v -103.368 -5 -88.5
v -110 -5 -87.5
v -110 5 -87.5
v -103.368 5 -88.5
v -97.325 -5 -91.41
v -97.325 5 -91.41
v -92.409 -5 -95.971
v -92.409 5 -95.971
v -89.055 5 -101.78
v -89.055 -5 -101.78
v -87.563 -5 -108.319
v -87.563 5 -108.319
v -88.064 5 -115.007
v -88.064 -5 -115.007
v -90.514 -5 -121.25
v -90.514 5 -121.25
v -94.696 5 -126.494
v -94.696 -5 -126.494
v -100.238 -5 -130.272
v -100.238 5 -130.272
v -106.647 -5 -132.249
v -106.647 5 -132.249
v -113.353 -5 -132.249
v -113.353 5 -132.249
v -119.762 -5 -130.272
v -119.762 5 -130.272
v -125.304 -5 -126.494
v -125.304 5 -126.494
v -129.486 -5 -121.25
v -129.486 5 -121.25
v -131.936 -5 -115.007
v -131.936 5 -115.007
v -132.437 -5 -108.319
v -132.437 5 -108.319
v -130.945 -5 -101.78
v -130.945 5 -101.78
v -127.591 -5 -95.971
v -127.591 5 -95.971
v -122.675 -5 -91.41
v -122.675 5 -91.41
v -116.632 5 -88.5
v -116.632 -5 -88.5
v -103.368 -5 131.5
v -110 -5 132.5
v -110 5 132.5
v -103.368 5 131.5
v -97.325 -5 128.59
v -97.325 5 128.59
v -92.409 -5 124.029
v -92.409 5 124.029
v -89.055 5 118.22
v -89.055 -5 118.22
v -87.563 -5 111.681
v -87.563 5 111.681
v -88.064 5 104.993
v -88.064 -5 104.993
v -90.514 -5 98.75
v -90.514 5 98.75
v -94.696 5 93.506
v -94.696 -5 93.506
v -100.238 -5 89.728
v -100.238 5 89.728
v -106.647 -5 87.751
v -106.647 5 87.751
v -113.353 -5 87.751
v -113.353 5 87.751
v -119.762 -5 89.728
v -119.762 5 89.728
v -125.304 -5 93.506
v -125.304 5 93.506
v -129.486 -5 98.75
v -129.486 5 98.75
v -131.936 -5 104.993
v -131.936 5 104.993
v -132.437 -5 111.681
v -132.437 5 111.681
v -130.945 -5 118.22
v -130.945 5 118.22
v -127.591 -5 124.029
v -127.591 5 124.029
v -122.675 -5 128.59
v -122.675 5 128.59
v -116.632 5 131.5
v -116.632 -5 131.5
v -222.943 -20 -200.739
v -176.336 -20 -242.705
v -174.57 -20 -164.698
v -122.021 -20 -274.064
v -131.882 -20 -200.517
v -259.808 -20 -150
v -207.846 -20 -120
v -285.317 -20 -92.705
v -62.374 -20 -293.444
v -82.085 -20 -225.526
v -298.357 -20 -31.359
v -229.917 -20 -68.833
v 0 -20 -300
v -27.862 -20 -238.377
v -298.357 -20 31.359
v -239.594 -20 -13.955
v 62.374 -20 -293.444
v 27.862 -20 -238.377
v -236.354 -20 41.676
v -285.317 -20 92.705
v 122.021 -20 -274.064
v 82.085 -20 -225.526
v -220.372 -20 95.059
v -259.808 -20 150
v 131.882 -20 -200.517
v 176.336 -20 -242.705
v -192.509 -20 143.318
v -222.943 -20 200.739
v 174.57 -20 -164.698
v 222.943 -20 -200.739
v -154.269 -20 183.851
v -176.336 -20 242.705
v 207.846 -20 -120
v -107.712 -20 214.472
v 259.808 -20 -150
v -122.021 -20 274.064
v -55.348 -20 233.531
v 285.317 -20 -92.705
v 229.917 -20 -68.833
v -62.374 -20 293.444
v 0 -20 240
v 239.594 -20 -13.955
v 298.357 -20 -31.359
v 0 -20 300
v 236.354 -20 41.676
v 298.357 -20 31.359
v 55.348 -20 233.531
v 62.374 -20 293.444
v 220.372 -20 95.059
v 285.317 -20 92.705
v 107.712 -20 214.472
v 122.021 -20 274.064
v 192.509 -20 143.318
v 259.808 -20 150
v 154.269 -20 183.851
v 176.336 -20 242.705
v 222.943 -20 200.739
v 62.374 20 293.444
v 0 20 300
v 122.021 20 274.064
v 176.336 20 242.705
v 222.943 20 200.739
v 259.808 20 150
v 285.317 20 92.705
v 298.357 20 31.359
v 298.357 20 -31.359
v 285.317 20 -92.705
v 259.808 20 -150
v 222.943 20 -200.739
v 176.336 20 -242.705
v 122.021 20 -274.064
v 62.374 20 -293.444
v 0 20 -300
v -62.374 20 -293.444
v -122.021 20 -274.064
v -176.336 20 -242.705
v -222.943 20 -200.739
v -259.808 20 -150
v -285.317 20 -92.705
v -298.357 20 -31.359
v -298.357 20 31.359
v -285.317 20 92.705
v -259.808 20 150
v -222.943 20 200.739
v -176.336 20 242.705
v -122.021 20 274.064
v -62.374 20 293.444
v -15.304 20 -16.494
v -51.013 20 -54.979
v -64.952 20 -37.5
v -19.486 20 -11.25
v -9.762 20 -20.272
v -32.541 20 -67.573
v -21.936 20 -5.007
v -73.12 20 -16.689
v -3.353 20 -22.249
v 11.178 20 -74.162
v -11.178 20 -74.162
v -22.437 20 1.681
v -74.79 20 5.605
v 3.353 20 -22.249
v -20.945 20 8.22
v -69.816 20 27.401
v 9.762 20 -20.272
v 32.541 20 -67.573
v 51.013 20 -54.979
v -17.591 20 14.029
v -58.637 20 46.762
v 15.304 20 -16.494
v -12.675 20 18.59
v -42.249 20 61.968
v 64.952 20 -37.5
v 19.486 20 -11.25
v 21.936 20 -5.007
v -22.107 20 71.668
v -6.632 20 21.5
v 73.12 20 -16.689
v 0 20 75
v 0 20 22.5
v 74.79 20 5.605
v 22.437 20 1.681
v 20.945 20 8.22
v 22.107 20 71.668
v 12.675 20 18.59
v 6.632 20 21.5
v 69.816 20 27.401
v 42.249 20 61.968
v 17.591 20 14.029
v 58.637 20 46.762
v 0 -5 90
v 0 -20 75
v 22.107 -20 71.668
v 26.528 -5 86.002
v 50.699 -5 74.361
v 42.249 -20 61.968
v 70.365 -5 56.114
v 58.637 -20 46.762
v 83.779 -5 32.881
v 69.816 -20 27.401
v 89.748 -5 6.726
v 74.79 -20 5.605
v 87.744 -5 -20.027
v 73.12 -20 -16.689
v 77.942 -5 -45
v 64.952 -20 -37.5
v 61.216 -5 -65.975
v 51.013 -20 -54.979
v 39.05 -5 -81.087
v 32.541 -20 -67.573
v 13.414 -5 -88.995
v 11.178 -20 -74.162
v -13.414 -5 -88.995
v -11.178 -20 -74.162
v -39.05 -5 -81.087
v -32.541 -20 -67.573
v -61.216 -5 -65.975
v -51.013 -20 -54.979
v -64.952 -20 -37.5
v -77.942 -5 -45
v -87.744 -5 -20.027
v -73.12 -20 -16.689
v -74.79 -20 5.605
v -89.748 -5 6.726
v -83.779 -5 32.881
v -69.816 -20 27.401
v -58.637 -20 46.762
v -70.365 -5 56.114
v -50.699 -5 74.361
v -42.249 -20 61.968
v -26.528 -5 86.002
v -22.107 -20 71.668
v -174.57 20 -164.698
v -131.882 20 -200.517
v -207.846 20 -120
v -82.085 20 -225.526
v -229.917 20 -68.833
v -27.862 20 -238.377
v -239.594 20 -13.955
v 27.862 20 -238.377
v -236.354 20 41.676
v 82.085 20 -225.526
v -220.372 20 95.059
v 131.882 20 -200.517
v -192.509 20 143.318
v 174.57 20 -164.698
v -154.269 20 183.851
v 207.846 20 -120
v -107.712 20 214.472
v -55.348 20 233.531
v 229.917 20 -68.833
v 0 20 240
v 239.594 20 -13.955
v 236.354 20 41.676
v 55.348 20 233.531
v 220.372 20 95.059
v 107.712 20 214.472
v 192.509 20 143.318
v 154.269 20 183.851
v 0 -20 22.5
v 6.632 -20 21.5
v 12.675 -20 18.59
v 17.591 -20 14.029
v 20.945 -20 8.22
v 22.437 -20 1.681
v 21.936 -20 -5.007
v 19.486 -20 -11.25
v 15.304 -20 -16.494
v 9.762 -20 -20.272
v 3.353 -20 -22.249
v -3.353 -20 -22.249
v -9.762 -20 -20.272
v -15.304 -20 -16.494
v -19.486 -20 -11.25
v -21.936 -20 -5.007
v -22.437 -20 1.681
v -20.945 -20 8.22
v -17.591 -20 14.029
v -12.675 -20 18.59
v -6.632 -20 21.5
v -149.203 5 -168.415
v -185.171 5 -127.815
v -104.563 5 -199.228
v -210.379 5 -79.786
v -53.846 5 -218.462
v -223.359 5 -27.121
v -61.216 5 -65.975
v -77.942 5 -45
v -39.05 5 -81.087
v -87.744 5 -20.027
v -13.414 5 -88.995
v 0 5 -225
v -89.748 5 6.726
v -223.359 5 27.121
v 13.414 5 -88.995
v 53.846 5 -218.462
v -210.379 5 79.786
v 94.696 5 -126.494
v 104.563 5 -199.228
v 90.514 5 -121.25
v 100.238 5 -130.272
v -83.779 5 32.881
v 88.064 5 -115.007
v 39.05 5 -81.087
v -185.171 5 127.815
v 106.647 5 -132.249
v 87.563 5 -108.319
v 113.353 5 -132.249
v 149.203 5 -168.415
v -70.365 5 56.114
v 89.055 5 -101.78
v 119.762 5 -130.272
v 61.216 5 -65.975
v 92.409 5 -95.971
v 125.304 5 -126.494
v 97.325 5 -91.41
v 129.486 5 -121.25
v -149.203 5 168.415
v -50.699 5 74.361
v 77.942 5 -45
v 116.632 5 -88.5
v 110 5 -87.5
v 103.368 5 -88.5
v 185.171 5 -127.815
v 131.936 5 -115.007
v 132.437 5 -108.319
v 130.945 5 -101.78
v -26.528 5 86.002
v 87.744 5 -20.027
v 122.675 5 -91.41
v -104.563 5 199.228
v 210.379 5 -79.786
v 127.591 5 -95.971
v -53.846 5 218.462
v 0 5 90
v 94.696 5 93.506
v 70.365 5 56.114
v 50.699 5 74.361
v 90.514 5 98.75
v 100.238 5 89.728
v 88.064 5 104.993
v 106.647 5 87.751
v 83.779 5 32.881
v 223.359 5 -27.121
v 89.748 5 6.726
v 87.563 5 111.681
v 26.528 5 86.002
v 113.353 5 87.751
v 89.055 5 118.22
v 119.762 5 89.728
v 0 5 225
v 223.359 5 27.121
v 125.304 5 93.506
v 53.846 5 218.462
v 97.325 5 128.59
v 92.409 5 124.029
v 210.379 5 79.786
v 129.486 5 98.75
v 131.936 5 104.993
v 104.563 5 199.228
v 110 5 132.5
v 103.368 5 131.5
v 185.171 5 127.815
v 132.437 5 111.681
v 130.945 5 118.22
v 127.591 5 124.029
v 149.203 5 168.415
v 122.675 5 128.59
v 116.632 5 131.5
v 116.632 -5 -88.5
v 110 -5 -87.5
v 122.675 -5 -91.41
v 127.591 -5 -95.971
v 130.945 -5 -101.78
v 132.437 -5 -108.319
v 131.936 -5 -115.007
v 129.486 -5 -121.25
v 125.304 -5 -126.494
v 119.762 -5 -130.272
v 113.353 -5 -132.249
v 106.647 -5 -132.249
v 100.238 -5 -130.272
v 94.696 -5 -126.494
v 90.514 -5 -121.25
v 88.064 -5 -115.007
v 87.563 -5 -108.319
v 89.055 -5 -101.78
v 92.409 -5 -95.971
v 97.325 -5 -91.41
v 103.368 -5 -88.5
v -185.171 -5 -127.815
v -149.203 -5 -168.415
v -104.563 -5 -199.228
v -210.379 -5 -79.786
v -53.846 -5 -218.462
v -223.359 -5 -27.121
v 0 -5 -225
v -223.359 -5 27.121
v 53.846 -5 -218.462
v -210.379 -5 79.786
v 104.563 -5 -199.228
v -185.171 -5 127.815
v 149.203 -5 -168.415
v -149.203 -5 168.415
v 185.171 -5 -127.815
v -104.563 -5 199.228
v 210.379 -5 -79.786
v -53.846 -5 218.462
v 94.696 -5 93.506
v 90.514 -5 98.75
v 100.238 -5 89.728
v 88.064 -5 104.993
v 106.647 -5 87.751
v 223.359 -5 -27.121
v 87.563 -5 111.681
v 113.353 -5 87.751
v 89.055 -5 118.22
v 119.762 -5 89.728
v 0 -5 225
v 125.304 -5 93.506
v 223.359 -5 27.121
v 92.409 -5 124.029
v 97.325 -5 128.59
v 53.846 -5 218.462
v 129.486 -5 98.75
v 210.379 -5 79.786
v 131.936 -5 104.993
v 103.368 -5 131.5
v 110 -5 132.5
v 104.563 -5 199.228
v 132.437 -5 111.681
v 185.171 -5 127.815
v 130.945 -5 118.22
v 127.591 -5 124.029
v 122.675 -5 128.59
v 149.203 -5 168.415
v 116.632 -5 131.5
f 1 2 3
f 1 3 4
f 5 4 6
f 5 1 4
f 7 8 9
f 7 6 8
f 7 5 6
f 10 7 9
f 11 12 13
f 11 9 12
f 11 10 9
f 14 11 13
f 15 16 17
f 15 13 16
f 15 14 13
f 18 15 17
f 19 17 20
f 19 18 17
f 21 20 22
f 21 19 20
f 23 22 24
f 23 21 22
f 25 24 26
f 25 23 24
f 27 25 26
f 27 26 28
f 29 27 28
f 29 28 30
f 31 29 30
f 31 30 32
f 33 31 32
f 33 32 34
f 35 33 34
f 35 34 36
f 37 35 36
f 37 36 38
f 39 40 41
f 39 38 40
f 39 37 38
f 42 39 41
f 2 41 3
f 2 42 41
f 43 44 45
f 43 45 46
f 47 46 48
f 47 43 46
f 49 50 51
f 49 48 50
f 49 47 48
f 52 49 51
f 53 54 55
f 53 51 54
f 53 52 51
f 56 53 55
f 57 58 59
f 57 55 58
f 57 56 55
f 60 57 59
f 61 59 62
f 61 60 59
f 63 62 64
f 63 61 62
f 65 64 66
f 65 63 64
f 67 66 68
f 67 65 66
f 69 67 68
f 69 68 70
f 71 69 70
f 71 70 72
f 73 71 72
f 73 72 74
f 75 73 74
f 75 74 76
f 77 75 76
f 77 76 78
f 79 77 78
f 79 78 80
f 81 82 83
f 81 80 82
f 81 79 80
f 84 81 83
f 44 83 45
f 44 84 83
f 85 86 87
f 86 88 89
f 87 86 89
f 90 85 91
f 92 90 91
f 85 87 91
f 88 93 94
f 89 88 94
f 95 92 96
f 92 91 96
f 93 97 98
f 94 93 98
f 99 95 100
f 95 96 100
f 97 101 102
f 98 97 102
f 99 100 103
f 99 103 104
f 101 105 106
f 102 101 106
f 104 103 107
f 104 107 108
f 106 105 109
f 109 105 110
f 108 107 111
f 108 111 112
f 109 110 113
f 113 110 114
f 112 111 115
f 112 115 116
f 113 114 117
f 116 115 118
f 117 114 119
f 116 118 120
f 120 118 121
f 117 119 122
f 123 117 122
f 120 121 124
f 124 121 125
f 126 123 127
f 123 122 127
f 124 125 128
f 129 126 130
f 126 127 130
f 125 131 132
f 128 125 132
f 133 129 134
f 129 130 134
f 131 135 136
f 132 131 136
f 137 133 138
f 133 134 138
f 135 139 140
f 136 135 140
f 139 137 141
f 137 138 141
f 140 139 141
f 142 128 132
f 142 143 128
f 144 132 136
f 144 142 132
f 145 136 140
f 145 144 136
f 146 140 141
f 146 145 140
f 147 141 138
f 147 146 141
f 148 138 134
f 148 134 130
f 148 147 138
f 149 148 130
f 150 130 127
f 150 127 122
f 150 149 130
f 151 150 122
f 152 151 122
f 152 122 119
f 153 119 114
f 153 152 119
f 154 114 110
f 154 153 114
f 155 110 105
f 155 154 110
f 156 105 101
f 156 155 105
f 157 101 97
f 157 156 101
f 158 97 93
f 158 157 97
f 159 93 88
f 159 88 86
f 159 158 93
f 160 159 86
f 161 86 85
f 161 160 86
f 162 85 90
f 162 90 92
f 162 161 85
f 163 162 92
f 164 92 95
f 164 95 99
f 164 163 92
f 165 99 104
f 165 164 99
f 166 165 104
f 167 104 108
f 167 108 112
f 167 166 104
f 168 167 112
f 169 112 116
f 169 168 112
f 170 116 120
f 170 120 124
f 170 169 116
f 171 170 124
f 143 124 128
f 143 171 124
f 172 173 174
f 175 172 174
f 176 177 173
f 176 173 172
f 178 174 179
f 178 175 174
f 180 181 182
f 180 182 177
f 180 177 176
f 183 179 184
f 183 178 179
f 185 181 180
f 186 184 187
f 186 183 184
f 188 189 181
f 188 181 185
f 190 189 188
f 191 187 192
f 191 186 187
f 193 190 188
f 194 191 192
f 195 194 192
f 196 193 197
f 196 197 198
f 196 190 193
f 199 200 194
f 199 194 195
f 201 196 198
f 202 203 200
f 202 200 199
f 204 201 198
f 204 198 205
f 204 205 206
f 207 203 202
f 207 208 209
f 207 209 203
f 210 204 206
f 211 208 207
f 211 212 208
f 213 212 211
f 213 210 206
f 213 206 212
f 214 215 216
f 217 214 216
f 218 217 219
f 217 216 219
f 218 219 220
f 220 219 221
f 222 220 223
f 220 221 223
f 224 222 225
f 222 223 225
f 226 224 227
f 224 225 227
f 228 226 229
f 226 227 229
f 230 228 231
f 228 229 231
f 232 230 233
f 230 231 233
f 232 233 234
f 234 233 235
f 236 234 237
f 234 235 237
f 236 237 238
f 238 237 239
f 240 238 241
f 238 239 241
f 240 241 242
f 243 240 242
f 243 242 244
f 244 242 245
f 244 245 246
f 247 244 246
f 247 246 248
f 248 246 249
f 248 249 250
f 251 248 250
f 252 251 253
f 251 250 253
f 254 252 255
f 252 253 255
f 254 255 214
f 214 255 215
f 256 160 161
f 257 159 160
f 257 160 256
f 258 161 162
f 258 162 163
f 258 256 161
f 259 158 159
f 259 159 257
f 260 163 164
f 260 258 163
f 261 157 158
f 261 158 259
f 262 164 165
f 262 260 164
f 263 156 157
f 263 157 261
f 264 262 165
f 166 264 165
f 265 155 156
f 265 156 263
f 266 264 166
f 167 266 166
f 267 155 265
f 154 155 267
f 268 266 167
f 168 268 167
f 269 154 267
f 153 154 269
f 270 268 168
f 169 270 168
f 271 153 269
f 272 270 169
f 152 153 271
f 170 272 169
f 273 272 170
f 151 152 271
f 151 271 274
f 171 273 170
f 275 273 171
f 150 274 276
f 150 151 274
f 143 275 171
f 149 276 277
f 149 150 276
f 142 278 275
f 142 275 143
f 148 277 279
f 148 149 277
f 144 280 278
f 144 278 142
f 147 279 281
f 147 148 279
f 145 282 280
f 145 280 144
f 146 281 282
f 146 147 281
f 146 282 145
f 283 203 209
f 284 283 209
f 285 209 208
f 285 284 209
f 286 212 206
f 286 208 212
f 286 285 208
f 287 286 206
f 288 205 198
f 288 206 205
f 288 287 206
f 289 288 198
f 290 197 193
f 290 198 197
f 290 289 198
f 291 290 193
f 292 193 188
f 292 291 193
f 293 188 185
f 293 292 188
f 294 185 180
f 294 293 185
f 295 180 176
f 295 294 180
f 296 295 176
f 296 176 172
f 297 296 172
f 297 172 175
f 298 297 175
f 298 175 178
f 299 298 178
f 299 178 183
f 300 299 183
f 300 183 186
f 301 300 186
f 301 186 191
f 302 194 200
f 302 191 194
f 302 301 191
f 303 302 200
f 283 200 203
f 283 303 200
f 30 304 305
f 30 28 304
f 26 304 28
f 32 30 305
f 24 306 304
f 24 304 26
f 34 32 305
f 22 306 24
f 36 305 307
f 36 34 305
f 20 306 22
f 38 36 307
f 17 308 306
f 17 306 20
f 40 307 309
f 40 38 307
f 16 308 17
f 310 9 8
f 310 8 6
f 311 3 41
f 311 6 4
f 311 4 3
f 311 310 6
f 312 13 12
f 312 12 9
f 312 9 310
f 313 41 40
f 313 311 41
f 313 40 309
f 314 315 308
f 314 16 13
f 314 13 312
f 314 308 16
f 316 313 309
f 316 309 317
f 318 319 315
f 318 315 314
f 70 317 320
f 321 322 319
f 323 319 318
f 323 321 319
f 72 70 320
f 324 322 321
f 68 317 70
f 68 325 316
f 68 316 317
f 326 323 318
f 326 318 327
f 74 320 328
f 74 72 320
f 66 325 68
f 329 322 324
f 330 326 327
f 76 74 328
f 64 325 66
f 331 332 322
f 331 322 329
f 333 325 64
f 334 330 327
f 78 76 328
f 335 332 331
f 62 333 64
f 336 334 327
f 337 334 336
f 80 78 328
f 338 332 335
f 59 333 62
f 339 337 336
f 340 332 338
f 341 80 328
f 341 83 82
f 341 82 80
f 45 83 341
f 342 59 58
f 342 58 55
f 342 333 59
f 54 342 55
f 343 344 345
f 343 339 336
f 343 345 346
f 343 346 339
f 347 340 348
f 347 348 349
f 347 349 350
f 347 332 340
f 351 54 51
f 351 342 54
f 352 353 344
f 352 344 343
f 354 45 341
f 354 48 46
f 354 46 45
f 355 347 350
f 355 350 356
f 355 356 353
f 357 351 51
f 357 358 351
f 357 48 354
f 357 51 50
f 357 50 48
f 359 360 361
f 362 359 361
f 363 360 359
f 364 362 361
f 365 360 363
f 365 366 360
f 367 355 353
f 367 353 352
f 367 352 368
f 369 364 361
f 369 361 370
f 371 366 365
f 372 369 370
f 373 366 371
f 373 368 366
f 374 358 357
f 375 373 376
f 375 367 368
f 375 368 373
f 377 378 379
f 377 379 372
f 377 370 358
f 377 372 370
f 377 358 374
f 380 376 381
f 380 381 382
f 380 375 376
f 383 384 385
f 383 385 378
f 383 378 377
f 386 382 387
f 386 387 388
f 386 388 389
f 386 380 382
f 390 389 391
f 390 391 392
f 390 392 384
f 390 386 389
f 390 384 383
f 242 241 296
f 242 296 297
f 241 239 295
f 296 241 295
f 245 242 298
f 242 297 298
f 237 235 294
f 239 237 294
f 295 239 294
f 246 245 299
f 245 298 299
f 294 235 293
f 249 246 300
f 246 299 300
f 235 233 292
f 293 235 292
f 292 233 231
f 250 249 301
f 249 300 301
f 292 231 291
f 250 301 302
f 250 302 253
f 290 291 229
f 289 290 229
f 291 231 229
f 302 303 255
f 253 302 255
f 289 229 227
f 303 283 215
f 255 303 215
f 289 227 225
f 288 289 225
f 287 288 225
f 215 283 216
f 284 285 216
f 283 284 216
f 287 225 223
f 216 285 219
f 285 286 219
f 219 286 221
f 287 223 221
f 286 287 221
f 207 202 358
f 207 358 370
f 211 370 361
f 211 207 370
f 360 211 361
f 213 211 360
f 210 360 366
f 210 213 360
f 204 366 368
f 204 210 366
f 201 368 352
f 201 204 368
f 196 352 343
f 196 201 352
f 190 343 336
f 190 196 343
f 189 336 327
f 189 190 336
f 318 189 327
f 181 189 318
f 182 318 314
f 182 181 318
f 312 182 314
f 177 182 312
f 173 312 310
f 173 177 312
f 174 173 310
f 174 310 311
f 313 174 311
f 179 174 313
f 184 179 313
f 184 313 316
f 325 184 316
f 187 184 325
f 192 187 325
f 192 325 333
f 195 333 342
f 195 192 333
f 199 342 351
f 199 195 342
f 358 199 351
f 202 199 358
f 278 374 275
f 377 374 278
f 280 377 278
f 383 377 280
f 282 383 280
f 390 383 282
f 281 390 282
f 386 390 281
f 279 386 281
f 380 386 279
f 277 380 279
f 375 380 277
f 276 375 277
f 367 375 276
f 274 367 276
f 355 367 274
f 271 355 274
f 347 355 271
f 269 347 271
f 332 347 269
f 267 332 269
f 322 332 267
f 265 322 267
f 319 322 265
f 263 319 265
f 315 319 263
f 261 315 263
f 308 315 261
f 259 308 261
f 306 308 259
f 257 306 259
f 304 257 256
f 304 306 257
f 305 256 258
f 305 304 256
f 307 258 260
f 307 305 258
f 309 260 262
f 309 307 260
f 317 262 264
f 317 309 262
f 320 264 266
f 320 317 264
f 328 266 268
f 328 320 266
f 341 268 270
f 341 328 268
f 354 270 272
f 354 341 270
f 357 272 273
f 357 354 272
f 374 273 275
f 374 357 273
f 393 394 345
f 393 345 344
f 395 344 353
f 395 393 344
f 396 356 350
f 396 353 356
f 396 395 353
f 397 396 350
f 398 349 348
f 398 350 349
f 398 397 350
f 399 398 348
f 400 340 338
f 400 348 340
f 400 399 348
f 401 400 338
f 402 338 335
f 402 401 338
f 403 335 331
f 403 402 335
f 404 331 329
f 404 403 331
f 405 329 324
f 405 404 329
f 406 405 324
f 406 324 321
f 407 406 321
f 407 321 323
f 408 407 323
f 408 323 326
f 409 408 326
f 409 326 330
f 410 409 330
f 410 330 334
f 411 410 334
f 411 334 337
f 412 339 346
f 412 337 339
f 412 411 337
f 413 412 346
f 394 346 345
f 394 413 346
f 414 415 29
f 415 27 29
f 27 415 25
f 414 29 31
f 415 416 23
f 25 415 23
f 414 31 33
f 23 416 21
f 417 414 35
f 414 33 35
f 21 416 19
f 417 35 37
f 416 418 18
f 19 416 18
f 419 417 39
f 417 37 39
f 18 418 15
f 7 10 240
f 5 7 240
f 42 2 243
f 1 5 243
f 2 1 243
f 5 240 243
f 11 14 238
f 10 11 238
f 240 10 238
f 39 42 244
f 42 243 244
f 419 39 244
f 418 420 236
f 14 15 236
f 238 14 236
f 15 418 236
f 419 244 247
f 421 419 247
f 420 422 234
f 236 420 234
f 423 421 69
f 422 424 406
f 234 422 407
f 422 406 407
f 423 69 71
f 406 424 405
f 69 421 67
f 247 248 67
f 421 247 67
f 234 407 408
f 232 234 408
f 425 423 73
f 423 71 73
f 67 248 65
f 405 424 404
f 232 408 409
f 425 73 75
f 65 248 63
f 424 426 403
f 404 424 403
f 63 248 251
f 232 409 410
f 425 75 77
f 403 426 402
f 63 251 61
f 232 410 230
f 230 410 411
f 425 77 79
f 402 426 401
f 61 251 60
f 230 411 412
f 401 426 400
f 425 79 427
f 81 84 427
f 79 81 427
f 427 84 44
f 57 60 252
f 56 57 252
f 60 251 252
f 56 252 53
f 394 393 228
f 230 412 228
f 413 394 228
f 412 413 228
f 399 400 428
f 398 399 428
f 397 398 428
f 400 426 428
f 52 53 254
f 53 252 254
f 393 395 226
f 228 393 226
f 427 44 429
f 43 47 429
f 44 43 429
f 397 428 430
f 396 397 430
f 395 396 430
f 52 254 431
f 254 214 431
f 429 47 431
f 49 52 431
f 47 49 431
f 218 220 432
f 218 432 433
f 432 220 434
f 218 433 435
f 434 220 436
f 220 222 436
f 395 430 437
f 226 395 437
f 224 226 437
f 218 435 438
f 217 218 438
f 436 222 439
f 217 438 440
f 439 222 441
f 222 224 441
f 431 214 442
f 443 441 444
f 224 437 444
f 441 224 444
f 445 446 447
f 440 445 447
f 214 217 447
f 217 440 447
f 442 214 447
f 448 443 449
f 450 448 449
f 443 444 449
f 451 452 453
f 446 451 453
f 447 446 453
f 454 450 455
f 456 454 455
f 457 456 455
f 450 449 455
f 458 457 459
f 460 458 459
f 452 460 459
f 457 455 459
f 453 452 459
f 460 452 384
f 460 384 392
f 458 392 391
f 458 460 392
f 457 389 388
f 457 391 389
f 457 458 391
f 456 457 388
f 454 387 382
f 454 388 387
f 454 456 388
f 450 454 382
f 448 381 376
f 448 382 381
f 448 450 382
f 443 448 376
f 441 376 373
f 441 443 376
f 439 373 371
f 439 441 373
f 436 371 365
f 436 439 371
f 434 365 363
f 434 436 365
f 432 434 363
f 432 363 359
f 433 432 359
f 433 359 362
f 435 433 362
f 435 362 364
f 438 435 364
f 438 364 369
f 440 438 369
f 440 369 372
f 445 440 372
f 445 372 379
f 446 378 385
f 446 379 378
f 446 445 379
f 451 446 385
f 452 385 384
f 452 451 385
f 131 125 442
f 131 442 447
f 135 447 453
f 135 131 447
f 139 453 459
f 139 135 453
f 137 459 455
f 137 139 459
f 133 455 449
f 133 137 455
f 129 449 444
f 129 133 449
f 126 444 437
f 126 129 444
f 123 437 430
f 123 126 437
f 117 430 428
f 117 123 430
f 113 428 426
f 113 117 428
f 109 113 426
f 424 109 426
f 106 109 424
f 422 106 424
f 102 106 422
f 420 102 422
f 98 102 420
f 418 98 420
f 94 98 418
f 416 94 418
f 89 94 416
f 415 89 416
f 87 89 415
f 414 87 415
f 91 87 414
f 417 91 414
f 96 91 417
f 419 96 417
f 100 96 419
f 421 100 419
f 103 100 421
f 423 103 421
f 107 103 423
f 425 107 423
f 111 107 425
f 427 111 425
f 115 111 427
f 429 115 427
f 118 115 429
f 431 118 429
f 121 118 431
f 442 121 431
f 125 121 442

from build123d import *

# Parameters (mm, degrees)
SKETCH1_R               = 300
SKETCH1_R_2             = 225
BOSS_EXTRUDE1_DEPTH     = 20
SKETCH1_R_3             = 90
BOSS_EXTRUDE1_2_DEPTH   = 20
SKETCH3_R               = 225
BOSS_EXTRUDE3_DEPTH     = 5
CHAMFER2_SIZE           = 15
CUT_EXTRUDE1_DEPTH      = 425.735211632
CUT_EXTRUDE1_DEPTH_BACK = 425.735211632
SKETCH4_R               = 22.5


with BuildPart() as part:
    # Sketch1 → Boss-Extrude1 (new, symmetric)
    with BuildSketch(Plane(origin=(0, 0, 0), x_dir=(1, 0, 0), z_dir=(0, 1, 0))):
        with Locations(Location((0, 0, 0), (0, 0, 270))):
            Circle(SKETCH1_R)
        with Locations(Location((0, 0, 0), (0, 0, 270))):
            Circle(SKETCH1_R_2, mode=Mode.SUBTRACT)
    extrude(amount=BOSS_EXTRUDE1_DEPTH, both=True)



with BuildPart() as body_2:
    # Sketch1 → Boss-Extrude1 2 (new, symmetric)
    with BuildSketch(Plane(origin=(0, 0, 0), x_dir=(1, 0, 0), z_dir=(0, 1, 0))):
        with Locations(Location((0, 0, 0), (0, 0, 270))):
            Circle(SKETCH1_R_3)
    extrude(amount=BOSS_EXTRUDE1_2_DEPTH, both=True)


with BuildPart() as part_1:
    add(part.part)

    add(body_2.part)  # Boss-Extrude3 merges body 2
    # Sketch3 → Boss-Extrude3 (add, symmetric)
    with BuildSketch(Plane(origin=(0, 0, 0), x_dir=(1, 0, 0), z_dir=(0, 1, 0))):
        with Locations(Location((0, 0, 0), (0, 0, 270))):
            Circle(SKETCH3_R)
    extrude(amount=BOSS_EXTRUDE3_DEPTH, both=True)

    # Chamfer2
    chamfer2_edges = [part_1.edges().sort_by_distance(p)[0] for p in [
        (0, -20, -90),
        (0, 20, -90),
        (0, -20, -225),
        (0, 20, -225),
    ]]
    chamfer(chamfer2_edges, length=CHAMFER2_SIZE - 0.0001)  # a hair under: the kernel refuses the full size

    # Sketch4 → Cut-Extrude1 (cut, two sides: drawn at the far end of the back side and taken through both)
    with BuildSketch(Plane(origin=(0, 0, 0), x_dir=(1, 0, 0), z_dir=(0, 1, 0)).offset(-CUT_EXTRUDE1_DEPTH_BACK)):
        with Locations(Location((0, 0, 0), (0, 0, 270))):
            Circle(SKETCH4_R)
        with Locations(Location((-110, 110, 0), (0, 0, 270))):
            Circle(SKETCH4_R)
        with Locations(Location((110, 110, 0), (0, 0, 270))):
            Circle(SKETCH4_R)
        with Locations(Location((110, -110, 0), (0, 0, 270))):
            Circle(SKETCH4_R)
        with Locations(Location((-110, -110, 0), (0, 0, 270))):
            Circle(SKETCH4_R)
    extrude(amount=CUT_EXTRUDE1_DEPTH + CUT_EXTRUDE1_DEPTH_BACK, mode=Mode.SUBTRACT)


solid = part_1.part
